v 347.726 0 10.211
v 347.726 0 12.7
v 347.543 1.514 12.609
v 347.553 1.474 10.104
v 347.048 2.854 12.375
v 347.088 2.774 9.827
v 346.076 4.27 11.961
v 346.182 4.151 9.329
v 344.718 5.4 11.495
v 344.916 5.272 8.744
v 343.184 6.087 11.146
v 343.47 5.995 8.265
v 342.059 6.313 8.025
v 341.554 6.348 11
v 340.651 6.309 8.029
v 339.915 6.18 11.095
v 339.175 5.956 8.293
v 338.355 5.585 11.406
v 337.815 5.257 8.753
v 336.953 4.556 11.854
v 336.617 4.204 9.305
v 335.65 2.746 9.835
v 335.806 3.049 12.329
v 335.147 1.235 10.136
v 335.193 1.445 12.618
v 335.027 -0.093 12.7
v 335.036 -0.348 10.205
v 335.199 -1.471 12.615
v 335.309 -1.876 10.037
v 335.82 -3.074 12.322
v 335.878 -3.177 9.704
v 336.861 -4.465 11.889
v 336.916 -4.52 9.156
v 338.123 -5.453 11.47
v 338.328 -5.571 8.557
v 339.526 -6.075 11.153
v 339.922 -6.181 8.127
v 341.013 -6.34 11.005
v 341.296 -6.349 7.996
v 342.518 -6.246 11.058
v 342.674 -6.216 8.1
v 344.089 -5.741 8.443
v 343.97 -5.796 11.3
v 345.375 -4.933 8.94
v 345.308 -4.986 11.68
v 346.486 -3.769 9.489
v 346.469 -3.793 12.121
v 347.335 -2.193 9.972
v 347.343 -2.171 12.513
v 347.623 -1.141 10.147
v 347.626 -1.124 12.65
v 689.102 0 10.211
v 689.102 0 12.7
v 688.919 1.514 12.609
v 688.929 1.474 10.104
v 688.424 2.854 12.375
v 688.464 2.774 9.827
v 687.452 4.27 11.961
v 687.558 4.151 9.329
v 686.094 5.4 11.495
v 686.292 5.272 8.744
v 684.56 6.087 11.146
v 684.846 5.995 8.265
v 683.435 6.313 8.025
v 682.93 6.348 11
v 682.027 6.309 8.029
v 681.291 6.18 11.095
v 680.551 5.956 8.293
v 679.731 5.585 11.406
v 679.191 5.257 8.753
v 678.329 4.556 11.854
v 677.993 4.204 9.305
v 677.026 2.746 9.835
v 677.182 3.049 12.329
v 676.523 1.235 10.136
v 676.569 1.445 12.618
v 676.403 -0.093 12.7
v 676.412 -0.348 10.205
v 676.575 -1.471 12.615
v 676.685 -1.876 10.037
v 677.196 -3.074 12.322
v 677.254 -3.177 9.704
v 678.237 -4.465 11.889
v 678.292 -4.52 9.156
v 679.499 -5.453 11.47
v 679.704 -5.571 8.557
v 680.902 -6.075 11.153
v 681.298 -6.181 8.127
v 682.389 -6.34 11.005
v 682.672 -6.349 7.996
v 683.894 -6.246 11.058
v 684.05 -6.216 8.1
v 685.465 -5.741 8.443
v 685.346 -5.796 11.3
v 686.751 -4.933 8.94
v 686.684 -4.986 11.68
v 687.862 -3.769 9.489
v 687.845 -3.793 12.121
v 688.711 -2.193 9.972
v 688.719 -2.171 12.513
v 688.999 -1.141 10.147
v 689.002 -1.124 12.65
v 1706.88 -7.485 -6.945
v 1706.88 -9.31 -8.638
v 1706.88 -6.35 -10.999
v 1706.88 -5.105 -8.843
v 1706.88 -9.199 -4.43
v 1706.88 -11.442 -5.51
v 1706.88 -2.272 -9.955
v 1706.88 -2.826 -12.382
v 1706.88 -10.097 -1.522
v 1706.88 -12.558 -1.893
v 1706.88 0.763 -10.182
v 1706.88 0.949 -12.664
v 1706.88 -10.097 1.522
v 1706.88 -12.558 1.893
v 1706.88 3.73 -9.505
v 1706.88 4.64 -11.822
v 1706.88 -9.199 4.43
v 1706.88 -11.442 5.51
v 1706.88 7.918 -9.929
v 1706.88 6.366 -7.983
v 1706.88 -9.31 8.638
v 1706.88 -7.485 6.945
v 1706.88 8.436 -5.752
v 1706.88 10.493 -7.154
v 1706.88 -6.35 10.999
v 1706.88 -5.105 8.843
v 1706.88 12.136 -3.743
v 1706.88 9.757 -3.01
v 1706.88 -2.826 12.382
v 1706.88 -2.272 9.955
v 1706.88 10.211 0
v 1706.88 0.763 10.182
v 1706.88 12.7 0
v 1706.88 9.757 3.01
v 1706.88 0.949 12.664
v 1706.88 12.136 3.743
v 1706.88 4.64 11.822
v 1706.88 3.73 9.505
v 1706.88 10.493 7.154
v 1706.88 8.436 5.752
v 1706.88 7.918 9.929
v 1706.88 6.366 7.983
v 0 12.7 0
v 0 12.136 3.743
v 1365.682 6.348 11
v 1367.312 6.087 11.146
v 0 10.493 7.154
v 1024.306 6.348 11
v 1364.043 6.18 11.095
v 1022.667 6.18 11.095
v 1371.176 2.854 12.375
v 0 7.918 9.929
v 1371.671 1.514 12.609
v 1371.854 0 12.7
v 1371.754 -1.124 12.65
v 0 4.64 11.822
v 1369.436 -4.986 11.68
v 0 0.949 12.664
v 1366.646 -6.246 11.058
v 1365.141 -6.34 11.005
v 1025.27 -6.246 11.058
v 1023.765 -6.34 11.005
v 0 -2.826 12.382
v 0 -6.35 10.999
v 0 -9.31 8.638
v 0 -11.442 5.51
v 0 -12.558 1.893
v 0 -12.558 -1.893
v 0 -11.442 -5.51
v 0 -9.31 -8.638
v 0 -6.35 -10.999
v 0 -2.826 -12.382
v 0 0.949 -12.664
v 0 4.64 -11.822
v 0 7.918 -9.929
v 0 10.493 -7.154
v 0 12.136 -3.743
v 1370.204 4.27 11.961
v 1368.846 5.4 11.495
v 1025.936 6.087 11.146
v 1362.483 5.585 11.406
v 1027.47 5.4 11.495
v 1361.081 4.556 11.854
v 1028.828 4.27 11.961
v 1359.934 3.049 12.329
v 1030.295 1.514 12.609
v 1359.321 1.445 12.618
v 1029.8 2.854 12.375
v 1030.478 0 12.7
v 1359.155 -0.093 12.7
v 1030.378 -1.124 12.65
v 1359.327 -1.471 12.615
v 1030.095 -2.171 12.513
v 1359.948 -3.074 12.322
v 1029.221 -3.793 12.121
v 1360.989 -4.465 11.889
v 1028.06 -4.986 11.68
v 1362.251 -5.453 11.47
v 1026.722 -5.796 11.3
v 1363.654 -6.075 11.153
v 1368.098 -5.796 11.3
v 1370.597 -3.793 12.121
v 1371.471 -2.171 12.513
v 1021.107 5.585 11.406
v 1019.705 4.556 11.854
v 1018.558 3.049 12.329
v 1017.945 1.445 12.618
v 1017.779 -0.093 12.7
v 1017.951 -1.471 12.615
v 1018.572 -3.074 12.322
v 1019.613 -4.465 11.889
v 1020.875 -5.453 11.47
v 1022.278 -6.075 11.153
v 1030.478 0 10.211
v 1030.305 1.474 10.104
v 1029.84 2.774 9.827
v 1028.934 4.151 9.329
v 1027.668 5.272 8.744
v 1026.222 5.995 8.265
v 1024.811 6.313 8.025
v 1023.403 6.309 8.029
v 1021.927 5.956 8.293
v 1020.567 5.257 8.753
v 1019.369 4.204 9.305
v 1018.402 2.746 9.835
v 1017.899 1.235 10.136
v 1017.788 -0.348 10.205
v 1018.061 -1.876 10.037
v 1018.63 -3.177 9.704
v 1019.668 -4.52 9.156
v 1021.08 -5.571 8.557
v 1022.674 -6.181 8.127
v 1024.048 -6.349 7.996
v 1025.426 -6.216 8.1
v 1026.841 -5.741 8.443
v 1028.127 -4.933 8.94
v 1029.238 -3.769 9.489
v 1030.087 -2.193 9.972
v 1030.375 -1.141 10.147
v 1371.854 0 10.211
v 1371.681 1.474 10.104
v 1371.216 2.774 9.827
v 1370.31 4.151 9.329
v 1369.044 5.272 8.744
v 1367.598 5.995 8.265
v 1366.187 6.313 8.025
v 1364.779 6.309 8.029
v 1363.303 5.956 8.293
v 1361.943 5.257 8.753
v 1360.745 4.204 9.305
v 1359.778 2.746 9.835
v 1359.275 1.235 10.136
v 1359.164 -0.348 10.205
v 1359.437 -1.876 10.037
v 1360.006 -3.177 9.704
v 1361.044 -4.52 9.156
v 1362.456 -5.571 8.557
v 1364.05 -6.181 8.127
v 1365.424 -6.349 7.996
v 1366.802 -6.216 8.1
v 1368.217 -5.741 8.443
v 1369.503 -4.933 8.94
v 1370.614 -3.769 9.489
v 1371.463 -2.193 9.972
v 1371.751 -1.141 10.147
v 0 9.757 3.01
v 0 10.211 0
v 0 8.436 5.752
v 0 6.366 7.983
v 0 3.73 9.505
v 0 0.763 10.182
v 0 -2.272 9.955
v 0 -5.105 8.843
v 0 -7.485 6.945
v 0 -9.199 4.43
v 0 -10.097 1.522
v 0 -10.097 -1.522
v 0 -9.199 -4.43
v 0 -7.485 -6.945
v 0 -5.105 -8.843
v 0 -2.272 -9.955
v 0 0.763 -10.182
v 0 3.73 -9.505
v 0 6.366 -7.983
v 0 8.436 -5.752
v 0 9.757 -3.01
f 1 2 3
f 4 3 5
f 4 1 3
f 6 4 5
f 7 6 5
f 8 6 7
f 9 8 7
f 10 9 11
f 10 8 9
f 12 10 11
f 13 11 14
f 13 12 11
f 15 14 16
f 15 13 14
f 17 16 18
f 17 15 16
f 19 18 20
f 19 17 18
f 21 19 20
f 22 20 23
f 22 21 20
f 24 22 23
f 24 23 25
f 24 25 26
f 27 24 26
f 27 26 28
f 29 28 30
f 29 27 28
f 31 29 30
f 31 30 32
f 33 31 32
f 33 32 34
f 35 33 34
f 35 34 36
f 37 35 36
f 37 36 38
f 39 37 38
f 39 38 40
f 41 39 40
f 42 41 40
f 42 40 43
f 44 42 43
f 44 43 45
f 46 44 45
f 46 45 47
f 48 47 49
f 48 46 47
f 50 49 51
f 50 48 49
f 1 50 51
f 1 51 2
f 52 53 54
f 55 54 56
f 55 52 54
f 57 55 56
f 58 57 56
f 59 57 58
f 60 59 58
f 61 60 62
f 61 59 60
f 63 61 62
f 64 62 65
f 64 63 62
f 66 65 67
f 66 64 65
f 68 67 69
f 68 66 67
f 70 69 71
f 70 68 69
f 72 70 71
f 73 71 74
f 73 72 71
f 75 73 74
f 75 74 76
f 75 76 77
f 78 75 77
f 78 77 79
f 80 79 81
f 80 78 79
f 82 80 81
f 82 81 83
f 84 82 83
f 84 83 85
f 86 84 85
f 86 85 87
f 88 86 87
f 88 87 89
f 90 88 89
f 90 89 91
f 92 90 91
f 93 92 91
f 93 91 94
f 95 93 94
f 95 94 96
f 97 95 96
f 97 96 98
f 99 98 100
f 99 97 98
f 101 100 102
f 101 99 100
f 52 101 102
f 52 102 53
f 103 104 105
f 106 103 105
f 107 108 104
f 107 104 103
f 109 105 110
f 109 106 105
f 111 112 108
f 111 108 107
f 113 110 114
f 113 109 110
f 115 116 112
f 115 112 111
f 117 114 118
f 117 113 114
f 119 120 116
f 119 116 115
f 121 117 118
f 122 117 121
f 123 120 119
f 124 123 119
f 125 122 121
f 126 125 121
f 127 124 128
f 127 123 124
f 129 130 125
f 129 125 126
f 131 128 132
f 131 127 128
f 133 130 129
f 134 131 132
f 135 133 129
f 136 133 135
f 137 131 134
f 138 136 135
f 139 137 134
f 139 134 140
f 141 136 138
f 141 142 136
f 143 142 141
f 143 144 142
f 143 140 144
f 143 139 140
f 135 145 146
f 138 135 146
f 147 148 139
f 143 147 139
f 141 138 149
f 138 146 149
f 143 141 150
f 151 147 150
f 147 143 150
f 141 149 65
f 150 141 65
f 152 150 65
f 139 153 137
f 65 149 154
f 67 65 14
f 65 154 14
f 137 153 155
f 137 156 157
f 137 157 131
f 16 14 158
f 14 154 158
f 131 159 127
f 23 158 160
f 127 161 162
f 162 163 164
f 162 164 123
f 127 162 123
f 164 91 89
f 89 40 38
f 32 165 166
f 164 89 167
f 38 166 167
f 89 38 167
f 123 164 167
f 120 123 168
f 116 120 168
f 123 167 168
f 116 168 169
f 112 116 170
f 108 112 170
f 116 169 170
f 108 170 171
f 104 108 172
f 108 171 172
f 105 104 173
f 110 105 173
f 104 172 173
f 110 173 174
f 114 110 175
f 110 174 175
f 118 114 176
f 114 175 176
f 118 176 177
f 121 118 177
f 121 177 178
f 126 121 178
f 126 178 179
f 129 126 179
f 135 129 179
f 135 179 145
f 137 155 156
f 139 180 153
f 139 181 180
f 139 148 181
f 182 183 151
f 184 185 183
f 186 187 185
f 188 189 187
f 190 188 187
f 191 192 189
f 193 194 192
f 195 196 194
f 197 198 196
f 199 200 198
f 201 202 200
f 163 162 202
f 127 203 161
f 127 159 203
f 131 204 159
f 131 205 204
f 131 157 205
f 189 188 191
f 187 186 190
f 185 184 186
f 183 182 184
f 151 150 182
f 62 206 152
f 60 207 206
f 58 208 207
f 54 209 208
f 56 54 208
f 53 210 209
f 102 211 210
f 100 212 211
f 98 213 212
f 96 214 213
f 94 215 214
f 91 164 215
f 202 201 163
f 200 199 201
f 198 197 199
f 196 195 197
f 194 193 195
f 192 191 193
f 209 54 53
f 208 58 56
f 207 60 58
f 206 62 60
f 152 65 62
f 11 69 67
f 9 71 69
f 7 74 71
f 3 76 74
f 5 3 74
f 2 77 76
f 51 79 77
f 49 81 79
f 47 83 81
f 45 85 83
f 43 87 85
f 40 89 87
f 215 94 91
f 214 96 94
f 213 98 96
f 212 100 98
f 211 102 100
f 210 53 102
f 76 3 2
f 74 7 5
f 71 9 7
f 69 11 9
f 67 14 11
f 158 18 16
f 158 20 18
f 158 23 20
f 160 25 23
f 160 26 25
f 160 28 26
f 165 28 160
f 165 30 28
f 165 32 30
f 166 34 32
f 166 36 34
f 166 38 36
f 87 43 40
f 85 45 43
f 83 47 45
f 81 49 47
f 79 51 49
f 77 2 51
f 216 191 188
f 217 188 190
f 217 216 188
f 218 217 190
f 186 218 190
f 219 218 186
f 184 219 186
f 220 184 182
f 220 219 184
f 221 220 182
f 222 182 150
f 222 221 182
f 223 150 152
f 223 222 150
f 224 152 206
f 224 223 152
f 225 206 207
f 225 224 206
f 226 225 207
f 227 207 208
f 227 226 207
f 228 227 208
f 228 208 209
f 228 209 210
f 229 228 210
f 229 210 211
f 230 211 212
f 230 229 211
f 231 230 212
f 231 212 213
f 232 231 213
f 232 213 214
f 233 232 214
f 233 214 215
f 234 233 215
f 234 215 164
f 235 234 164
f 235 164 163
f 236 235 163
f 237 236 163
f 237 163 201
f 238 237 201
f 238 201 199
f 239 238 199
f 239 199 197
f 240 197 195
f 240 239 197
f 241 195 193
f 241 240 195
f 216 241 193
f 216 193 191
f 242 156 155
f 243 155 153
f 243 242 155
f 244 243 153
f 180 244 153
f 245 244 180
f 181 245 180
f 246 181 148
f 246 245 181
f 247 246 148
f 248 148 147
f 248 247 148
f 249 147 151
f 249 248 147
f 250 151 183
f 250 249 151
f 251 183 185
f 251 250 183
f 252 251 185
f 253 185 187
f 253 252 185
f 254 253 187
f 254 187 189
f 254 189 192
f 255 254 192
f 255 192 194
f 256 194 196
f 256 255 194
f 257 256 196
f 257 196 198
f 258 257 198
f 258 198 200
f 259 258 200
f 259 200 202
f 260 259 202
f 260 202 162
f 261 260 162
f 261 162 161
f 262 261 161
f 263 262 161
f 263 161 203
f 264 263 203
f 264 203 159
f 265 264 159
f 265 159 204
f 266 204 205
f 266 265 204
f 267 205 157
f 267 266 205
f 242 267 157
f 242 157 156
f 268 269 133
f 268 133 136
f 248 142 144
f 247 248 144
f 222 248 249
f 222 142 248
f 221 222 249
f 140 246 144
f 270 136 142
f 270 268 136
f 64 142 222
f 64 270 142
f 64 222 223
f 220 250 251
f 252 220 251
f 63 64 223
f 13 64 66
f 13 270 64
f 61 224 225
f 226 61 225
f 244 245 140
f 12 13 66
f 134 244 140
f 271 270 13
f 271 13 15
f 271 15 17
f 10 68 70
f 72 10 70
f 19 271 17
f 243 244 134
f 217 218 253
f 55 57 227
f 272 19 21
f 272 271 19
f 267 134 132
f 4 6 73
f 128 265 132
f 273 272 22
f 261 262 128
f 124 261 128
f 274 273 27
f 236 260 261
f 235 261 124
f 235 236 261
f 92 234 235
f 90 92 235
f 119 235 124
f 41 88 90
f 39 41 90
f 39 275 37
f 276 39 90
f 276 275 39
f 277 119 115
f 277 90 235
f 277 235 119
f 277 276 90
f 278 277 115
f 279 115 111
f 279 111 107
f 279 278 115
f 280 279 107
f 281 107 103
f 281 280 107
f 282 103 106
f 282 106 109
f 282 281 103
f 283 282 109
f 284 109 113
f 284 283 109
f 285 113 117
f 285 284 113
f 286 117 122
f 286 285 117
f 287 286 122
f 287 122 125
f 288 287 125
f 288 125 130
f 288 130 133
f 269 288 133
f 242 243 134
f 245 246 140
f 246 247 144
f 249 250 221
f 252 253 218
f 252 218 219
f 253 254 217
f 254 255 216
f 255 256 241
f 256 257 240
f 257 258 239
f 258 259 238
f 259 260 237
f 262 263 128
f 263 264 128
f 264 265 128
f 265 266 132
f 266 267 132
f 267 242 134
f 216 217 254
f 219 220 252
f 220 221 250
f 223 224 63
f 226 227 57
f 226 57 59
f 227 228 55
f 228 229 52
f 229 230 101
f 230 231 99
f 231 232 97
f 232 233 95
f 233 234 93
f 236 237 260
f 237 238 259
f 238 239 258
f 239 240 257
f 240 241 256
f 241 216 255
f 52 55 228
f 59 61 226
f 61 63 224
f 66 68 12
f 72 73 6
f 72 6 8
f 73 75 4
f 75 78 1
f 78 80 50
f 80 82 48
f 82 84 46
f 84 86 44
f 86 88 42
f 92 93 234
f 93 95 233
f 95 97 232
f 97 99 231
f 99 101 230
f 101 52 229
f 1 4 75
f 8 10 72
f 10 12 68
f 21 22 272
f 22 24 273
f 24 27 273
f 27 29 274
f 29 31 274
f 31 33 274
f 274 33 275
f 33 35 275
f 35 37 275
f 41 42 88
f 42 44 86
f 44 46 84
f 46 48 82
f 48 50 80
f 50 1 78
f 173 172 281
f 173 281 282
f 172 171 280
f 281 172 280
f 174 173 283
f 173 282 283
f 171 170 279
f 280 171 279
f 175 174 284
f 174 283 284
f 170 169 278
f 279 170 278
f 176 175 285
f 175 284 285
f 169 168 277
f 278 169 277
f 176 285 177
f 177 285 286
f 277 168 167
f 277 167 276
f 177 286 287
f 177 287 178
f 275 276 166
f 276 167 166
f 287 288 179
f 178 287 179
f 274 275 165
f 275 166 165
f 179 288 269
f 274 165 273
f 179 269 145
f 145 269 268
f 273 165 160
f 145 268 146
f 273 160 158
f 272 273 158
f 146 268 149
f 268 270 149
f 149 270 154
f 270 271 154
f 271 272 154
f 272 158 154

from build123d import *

# Parameters (mm, degrees)
F0_R     = 12.7
F0_R_2   = 10.210562
F1_DEPTH = 1706.88
F2_R     = 6.35
F3_DEPTH = 25.4


with BuildPart() as f1:
    # F0 (on Right) → F1 (new body)
    with BuildSketch(Plane.YZ):
        Circle(F0_R)
        Circle(F0_R_2, mode=Mode.SUBTRACT)
    extrude(amount=F1_DEPTH)

    # F2 (on Top) → F3 (cut)
    with BuildSketch(Plane.XY):
        with Locations((341.376, 0)):
            Circle(F2_R)
        with Locations((682.752, 0)):
            Circle(F2_R)
        with Locations((1024.128, 0)):
            Circle(F2_R)
        with Locations((1365.504, 0)):
            Circle(F2_R)
    extrude(amount=F3_DEPTH, mode=Mode.SUBTRACT)


solid = f1.part
